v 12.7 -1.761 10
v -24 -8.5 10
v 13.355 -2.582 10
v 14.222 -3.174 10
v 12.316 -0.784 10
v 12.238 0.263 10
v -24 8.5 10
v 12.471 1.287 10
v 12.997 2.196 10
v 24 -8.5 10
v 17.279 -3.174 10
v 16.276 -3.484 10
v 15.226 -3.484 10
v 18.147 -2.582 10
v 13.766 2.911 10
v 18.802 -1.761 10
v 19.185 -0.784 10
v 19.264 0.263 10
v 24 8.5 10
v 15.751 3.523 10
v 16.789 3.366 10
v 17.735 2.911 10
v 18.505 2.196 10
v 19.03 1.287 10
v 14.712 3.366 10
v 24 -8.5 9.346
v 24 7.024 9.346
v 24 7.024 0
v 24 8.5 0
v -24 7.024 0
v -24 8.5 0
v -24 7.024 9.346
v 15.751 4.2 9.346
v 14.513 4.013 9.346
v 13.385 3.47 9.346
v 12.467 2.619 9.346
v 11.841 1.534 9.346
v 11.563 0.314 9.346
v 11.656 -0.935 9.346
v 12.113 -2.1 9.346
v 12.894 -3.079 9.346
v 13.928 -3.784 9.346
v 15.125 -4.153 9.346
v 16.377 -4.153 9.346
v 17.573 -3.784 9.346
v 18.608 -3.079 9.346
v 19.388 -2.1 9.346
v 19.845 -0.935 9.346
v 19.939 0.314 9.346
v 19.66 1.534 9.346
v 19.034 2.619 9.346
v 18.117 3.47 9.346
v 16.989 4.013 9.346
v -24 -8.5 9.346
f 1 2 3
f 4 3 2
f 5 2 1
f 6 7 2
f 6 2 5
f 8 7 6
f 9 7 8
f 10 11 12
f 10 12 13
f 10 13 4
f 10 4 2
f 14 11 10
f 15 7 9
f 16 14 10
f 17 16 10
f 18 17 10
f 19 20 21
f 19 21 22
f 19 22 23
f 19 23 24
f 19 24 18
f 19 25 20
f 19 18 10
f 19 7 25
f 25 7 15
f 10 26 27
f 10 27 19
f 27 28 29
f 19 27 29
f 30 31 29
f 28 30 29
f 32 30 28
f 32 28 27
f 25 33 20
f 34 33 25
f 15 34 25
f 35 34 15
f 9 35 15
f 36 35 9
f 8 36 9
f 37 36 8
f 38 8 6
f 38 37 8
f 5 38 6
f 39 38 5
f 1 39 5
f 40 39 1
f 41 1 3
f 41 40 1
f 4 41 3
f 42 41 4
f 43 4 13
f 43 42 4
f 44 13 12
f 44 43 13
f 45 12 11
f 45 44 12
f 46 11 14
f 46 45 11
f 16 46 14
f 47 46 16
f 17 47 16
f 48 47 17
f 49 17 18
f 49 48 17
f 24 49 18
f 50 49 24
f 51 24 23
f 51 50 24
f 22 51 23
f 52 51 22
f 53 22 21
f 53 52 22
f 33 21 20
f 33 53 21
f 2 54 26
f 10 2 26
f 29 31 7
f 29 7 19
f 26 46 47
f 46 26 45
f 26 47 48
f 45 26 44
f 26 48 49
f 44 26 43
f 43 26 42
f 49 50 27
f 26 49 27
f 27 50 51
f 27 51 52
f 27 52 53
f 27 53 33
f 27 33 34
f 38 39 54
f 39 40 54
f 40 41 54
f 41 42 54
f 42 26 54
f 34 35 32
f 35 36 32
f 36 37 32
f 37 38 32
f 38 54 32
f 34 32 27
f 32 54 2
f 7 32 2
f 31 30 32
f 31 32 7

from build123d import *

# Parameters (mm, degrees)
CROQUIS1_W              = 48
CROQUIS1_H              = 17
SALIENTE_EXTRUIR1_DEPTH = 10
CROQUIS7_W              = 9.346110156
CROQUIS7_H              = 15.524186193
CORTAR_EXTRUIR1_DEPTH   = 49


with BuildPart() as part:
    # Croquis1 → Saliente-Extruir1 (new body)
    with BuildSketch(Plane.XY):
        Rectangle(CROQUIS1_W, CROQUIS1_H)
    extrude(amount=SALIENTE_EXTRUIR1_DEPTH)

    # Croquis7 → Cortar-Extruir1 (cut, through all)
    with BuildSketch(Plane.ZY.offset(24)):
        with Locations((4.673055078, -0.737906903)):
            Rectangle(CROQUIS7_W, CROQUIS7_H)
    extrude(amount=-CORTAR_EXTRUIR1_DEPTH, mode=Mode.SUBTRACT)

    # Croquis12 → Taladro de margen para M3.53 (revolve, cut)
    with BuildSketch(Plane(origin=(15.750802653, 0, 9.346110156), x_dir=(0, 1, 0), z_dir=(1, 0, 0))):
        Polygon((0, 0), (0, 0.653889844), (1.95, 0.653889844), (1.95, 2.172799743), (4.2, 0), align=None)
    revolve(axis=Axis((15.750802653, 0, 2.996110156), (0, 0, 1)), mode=Mode.SUBTRACT)


solid = part.part
